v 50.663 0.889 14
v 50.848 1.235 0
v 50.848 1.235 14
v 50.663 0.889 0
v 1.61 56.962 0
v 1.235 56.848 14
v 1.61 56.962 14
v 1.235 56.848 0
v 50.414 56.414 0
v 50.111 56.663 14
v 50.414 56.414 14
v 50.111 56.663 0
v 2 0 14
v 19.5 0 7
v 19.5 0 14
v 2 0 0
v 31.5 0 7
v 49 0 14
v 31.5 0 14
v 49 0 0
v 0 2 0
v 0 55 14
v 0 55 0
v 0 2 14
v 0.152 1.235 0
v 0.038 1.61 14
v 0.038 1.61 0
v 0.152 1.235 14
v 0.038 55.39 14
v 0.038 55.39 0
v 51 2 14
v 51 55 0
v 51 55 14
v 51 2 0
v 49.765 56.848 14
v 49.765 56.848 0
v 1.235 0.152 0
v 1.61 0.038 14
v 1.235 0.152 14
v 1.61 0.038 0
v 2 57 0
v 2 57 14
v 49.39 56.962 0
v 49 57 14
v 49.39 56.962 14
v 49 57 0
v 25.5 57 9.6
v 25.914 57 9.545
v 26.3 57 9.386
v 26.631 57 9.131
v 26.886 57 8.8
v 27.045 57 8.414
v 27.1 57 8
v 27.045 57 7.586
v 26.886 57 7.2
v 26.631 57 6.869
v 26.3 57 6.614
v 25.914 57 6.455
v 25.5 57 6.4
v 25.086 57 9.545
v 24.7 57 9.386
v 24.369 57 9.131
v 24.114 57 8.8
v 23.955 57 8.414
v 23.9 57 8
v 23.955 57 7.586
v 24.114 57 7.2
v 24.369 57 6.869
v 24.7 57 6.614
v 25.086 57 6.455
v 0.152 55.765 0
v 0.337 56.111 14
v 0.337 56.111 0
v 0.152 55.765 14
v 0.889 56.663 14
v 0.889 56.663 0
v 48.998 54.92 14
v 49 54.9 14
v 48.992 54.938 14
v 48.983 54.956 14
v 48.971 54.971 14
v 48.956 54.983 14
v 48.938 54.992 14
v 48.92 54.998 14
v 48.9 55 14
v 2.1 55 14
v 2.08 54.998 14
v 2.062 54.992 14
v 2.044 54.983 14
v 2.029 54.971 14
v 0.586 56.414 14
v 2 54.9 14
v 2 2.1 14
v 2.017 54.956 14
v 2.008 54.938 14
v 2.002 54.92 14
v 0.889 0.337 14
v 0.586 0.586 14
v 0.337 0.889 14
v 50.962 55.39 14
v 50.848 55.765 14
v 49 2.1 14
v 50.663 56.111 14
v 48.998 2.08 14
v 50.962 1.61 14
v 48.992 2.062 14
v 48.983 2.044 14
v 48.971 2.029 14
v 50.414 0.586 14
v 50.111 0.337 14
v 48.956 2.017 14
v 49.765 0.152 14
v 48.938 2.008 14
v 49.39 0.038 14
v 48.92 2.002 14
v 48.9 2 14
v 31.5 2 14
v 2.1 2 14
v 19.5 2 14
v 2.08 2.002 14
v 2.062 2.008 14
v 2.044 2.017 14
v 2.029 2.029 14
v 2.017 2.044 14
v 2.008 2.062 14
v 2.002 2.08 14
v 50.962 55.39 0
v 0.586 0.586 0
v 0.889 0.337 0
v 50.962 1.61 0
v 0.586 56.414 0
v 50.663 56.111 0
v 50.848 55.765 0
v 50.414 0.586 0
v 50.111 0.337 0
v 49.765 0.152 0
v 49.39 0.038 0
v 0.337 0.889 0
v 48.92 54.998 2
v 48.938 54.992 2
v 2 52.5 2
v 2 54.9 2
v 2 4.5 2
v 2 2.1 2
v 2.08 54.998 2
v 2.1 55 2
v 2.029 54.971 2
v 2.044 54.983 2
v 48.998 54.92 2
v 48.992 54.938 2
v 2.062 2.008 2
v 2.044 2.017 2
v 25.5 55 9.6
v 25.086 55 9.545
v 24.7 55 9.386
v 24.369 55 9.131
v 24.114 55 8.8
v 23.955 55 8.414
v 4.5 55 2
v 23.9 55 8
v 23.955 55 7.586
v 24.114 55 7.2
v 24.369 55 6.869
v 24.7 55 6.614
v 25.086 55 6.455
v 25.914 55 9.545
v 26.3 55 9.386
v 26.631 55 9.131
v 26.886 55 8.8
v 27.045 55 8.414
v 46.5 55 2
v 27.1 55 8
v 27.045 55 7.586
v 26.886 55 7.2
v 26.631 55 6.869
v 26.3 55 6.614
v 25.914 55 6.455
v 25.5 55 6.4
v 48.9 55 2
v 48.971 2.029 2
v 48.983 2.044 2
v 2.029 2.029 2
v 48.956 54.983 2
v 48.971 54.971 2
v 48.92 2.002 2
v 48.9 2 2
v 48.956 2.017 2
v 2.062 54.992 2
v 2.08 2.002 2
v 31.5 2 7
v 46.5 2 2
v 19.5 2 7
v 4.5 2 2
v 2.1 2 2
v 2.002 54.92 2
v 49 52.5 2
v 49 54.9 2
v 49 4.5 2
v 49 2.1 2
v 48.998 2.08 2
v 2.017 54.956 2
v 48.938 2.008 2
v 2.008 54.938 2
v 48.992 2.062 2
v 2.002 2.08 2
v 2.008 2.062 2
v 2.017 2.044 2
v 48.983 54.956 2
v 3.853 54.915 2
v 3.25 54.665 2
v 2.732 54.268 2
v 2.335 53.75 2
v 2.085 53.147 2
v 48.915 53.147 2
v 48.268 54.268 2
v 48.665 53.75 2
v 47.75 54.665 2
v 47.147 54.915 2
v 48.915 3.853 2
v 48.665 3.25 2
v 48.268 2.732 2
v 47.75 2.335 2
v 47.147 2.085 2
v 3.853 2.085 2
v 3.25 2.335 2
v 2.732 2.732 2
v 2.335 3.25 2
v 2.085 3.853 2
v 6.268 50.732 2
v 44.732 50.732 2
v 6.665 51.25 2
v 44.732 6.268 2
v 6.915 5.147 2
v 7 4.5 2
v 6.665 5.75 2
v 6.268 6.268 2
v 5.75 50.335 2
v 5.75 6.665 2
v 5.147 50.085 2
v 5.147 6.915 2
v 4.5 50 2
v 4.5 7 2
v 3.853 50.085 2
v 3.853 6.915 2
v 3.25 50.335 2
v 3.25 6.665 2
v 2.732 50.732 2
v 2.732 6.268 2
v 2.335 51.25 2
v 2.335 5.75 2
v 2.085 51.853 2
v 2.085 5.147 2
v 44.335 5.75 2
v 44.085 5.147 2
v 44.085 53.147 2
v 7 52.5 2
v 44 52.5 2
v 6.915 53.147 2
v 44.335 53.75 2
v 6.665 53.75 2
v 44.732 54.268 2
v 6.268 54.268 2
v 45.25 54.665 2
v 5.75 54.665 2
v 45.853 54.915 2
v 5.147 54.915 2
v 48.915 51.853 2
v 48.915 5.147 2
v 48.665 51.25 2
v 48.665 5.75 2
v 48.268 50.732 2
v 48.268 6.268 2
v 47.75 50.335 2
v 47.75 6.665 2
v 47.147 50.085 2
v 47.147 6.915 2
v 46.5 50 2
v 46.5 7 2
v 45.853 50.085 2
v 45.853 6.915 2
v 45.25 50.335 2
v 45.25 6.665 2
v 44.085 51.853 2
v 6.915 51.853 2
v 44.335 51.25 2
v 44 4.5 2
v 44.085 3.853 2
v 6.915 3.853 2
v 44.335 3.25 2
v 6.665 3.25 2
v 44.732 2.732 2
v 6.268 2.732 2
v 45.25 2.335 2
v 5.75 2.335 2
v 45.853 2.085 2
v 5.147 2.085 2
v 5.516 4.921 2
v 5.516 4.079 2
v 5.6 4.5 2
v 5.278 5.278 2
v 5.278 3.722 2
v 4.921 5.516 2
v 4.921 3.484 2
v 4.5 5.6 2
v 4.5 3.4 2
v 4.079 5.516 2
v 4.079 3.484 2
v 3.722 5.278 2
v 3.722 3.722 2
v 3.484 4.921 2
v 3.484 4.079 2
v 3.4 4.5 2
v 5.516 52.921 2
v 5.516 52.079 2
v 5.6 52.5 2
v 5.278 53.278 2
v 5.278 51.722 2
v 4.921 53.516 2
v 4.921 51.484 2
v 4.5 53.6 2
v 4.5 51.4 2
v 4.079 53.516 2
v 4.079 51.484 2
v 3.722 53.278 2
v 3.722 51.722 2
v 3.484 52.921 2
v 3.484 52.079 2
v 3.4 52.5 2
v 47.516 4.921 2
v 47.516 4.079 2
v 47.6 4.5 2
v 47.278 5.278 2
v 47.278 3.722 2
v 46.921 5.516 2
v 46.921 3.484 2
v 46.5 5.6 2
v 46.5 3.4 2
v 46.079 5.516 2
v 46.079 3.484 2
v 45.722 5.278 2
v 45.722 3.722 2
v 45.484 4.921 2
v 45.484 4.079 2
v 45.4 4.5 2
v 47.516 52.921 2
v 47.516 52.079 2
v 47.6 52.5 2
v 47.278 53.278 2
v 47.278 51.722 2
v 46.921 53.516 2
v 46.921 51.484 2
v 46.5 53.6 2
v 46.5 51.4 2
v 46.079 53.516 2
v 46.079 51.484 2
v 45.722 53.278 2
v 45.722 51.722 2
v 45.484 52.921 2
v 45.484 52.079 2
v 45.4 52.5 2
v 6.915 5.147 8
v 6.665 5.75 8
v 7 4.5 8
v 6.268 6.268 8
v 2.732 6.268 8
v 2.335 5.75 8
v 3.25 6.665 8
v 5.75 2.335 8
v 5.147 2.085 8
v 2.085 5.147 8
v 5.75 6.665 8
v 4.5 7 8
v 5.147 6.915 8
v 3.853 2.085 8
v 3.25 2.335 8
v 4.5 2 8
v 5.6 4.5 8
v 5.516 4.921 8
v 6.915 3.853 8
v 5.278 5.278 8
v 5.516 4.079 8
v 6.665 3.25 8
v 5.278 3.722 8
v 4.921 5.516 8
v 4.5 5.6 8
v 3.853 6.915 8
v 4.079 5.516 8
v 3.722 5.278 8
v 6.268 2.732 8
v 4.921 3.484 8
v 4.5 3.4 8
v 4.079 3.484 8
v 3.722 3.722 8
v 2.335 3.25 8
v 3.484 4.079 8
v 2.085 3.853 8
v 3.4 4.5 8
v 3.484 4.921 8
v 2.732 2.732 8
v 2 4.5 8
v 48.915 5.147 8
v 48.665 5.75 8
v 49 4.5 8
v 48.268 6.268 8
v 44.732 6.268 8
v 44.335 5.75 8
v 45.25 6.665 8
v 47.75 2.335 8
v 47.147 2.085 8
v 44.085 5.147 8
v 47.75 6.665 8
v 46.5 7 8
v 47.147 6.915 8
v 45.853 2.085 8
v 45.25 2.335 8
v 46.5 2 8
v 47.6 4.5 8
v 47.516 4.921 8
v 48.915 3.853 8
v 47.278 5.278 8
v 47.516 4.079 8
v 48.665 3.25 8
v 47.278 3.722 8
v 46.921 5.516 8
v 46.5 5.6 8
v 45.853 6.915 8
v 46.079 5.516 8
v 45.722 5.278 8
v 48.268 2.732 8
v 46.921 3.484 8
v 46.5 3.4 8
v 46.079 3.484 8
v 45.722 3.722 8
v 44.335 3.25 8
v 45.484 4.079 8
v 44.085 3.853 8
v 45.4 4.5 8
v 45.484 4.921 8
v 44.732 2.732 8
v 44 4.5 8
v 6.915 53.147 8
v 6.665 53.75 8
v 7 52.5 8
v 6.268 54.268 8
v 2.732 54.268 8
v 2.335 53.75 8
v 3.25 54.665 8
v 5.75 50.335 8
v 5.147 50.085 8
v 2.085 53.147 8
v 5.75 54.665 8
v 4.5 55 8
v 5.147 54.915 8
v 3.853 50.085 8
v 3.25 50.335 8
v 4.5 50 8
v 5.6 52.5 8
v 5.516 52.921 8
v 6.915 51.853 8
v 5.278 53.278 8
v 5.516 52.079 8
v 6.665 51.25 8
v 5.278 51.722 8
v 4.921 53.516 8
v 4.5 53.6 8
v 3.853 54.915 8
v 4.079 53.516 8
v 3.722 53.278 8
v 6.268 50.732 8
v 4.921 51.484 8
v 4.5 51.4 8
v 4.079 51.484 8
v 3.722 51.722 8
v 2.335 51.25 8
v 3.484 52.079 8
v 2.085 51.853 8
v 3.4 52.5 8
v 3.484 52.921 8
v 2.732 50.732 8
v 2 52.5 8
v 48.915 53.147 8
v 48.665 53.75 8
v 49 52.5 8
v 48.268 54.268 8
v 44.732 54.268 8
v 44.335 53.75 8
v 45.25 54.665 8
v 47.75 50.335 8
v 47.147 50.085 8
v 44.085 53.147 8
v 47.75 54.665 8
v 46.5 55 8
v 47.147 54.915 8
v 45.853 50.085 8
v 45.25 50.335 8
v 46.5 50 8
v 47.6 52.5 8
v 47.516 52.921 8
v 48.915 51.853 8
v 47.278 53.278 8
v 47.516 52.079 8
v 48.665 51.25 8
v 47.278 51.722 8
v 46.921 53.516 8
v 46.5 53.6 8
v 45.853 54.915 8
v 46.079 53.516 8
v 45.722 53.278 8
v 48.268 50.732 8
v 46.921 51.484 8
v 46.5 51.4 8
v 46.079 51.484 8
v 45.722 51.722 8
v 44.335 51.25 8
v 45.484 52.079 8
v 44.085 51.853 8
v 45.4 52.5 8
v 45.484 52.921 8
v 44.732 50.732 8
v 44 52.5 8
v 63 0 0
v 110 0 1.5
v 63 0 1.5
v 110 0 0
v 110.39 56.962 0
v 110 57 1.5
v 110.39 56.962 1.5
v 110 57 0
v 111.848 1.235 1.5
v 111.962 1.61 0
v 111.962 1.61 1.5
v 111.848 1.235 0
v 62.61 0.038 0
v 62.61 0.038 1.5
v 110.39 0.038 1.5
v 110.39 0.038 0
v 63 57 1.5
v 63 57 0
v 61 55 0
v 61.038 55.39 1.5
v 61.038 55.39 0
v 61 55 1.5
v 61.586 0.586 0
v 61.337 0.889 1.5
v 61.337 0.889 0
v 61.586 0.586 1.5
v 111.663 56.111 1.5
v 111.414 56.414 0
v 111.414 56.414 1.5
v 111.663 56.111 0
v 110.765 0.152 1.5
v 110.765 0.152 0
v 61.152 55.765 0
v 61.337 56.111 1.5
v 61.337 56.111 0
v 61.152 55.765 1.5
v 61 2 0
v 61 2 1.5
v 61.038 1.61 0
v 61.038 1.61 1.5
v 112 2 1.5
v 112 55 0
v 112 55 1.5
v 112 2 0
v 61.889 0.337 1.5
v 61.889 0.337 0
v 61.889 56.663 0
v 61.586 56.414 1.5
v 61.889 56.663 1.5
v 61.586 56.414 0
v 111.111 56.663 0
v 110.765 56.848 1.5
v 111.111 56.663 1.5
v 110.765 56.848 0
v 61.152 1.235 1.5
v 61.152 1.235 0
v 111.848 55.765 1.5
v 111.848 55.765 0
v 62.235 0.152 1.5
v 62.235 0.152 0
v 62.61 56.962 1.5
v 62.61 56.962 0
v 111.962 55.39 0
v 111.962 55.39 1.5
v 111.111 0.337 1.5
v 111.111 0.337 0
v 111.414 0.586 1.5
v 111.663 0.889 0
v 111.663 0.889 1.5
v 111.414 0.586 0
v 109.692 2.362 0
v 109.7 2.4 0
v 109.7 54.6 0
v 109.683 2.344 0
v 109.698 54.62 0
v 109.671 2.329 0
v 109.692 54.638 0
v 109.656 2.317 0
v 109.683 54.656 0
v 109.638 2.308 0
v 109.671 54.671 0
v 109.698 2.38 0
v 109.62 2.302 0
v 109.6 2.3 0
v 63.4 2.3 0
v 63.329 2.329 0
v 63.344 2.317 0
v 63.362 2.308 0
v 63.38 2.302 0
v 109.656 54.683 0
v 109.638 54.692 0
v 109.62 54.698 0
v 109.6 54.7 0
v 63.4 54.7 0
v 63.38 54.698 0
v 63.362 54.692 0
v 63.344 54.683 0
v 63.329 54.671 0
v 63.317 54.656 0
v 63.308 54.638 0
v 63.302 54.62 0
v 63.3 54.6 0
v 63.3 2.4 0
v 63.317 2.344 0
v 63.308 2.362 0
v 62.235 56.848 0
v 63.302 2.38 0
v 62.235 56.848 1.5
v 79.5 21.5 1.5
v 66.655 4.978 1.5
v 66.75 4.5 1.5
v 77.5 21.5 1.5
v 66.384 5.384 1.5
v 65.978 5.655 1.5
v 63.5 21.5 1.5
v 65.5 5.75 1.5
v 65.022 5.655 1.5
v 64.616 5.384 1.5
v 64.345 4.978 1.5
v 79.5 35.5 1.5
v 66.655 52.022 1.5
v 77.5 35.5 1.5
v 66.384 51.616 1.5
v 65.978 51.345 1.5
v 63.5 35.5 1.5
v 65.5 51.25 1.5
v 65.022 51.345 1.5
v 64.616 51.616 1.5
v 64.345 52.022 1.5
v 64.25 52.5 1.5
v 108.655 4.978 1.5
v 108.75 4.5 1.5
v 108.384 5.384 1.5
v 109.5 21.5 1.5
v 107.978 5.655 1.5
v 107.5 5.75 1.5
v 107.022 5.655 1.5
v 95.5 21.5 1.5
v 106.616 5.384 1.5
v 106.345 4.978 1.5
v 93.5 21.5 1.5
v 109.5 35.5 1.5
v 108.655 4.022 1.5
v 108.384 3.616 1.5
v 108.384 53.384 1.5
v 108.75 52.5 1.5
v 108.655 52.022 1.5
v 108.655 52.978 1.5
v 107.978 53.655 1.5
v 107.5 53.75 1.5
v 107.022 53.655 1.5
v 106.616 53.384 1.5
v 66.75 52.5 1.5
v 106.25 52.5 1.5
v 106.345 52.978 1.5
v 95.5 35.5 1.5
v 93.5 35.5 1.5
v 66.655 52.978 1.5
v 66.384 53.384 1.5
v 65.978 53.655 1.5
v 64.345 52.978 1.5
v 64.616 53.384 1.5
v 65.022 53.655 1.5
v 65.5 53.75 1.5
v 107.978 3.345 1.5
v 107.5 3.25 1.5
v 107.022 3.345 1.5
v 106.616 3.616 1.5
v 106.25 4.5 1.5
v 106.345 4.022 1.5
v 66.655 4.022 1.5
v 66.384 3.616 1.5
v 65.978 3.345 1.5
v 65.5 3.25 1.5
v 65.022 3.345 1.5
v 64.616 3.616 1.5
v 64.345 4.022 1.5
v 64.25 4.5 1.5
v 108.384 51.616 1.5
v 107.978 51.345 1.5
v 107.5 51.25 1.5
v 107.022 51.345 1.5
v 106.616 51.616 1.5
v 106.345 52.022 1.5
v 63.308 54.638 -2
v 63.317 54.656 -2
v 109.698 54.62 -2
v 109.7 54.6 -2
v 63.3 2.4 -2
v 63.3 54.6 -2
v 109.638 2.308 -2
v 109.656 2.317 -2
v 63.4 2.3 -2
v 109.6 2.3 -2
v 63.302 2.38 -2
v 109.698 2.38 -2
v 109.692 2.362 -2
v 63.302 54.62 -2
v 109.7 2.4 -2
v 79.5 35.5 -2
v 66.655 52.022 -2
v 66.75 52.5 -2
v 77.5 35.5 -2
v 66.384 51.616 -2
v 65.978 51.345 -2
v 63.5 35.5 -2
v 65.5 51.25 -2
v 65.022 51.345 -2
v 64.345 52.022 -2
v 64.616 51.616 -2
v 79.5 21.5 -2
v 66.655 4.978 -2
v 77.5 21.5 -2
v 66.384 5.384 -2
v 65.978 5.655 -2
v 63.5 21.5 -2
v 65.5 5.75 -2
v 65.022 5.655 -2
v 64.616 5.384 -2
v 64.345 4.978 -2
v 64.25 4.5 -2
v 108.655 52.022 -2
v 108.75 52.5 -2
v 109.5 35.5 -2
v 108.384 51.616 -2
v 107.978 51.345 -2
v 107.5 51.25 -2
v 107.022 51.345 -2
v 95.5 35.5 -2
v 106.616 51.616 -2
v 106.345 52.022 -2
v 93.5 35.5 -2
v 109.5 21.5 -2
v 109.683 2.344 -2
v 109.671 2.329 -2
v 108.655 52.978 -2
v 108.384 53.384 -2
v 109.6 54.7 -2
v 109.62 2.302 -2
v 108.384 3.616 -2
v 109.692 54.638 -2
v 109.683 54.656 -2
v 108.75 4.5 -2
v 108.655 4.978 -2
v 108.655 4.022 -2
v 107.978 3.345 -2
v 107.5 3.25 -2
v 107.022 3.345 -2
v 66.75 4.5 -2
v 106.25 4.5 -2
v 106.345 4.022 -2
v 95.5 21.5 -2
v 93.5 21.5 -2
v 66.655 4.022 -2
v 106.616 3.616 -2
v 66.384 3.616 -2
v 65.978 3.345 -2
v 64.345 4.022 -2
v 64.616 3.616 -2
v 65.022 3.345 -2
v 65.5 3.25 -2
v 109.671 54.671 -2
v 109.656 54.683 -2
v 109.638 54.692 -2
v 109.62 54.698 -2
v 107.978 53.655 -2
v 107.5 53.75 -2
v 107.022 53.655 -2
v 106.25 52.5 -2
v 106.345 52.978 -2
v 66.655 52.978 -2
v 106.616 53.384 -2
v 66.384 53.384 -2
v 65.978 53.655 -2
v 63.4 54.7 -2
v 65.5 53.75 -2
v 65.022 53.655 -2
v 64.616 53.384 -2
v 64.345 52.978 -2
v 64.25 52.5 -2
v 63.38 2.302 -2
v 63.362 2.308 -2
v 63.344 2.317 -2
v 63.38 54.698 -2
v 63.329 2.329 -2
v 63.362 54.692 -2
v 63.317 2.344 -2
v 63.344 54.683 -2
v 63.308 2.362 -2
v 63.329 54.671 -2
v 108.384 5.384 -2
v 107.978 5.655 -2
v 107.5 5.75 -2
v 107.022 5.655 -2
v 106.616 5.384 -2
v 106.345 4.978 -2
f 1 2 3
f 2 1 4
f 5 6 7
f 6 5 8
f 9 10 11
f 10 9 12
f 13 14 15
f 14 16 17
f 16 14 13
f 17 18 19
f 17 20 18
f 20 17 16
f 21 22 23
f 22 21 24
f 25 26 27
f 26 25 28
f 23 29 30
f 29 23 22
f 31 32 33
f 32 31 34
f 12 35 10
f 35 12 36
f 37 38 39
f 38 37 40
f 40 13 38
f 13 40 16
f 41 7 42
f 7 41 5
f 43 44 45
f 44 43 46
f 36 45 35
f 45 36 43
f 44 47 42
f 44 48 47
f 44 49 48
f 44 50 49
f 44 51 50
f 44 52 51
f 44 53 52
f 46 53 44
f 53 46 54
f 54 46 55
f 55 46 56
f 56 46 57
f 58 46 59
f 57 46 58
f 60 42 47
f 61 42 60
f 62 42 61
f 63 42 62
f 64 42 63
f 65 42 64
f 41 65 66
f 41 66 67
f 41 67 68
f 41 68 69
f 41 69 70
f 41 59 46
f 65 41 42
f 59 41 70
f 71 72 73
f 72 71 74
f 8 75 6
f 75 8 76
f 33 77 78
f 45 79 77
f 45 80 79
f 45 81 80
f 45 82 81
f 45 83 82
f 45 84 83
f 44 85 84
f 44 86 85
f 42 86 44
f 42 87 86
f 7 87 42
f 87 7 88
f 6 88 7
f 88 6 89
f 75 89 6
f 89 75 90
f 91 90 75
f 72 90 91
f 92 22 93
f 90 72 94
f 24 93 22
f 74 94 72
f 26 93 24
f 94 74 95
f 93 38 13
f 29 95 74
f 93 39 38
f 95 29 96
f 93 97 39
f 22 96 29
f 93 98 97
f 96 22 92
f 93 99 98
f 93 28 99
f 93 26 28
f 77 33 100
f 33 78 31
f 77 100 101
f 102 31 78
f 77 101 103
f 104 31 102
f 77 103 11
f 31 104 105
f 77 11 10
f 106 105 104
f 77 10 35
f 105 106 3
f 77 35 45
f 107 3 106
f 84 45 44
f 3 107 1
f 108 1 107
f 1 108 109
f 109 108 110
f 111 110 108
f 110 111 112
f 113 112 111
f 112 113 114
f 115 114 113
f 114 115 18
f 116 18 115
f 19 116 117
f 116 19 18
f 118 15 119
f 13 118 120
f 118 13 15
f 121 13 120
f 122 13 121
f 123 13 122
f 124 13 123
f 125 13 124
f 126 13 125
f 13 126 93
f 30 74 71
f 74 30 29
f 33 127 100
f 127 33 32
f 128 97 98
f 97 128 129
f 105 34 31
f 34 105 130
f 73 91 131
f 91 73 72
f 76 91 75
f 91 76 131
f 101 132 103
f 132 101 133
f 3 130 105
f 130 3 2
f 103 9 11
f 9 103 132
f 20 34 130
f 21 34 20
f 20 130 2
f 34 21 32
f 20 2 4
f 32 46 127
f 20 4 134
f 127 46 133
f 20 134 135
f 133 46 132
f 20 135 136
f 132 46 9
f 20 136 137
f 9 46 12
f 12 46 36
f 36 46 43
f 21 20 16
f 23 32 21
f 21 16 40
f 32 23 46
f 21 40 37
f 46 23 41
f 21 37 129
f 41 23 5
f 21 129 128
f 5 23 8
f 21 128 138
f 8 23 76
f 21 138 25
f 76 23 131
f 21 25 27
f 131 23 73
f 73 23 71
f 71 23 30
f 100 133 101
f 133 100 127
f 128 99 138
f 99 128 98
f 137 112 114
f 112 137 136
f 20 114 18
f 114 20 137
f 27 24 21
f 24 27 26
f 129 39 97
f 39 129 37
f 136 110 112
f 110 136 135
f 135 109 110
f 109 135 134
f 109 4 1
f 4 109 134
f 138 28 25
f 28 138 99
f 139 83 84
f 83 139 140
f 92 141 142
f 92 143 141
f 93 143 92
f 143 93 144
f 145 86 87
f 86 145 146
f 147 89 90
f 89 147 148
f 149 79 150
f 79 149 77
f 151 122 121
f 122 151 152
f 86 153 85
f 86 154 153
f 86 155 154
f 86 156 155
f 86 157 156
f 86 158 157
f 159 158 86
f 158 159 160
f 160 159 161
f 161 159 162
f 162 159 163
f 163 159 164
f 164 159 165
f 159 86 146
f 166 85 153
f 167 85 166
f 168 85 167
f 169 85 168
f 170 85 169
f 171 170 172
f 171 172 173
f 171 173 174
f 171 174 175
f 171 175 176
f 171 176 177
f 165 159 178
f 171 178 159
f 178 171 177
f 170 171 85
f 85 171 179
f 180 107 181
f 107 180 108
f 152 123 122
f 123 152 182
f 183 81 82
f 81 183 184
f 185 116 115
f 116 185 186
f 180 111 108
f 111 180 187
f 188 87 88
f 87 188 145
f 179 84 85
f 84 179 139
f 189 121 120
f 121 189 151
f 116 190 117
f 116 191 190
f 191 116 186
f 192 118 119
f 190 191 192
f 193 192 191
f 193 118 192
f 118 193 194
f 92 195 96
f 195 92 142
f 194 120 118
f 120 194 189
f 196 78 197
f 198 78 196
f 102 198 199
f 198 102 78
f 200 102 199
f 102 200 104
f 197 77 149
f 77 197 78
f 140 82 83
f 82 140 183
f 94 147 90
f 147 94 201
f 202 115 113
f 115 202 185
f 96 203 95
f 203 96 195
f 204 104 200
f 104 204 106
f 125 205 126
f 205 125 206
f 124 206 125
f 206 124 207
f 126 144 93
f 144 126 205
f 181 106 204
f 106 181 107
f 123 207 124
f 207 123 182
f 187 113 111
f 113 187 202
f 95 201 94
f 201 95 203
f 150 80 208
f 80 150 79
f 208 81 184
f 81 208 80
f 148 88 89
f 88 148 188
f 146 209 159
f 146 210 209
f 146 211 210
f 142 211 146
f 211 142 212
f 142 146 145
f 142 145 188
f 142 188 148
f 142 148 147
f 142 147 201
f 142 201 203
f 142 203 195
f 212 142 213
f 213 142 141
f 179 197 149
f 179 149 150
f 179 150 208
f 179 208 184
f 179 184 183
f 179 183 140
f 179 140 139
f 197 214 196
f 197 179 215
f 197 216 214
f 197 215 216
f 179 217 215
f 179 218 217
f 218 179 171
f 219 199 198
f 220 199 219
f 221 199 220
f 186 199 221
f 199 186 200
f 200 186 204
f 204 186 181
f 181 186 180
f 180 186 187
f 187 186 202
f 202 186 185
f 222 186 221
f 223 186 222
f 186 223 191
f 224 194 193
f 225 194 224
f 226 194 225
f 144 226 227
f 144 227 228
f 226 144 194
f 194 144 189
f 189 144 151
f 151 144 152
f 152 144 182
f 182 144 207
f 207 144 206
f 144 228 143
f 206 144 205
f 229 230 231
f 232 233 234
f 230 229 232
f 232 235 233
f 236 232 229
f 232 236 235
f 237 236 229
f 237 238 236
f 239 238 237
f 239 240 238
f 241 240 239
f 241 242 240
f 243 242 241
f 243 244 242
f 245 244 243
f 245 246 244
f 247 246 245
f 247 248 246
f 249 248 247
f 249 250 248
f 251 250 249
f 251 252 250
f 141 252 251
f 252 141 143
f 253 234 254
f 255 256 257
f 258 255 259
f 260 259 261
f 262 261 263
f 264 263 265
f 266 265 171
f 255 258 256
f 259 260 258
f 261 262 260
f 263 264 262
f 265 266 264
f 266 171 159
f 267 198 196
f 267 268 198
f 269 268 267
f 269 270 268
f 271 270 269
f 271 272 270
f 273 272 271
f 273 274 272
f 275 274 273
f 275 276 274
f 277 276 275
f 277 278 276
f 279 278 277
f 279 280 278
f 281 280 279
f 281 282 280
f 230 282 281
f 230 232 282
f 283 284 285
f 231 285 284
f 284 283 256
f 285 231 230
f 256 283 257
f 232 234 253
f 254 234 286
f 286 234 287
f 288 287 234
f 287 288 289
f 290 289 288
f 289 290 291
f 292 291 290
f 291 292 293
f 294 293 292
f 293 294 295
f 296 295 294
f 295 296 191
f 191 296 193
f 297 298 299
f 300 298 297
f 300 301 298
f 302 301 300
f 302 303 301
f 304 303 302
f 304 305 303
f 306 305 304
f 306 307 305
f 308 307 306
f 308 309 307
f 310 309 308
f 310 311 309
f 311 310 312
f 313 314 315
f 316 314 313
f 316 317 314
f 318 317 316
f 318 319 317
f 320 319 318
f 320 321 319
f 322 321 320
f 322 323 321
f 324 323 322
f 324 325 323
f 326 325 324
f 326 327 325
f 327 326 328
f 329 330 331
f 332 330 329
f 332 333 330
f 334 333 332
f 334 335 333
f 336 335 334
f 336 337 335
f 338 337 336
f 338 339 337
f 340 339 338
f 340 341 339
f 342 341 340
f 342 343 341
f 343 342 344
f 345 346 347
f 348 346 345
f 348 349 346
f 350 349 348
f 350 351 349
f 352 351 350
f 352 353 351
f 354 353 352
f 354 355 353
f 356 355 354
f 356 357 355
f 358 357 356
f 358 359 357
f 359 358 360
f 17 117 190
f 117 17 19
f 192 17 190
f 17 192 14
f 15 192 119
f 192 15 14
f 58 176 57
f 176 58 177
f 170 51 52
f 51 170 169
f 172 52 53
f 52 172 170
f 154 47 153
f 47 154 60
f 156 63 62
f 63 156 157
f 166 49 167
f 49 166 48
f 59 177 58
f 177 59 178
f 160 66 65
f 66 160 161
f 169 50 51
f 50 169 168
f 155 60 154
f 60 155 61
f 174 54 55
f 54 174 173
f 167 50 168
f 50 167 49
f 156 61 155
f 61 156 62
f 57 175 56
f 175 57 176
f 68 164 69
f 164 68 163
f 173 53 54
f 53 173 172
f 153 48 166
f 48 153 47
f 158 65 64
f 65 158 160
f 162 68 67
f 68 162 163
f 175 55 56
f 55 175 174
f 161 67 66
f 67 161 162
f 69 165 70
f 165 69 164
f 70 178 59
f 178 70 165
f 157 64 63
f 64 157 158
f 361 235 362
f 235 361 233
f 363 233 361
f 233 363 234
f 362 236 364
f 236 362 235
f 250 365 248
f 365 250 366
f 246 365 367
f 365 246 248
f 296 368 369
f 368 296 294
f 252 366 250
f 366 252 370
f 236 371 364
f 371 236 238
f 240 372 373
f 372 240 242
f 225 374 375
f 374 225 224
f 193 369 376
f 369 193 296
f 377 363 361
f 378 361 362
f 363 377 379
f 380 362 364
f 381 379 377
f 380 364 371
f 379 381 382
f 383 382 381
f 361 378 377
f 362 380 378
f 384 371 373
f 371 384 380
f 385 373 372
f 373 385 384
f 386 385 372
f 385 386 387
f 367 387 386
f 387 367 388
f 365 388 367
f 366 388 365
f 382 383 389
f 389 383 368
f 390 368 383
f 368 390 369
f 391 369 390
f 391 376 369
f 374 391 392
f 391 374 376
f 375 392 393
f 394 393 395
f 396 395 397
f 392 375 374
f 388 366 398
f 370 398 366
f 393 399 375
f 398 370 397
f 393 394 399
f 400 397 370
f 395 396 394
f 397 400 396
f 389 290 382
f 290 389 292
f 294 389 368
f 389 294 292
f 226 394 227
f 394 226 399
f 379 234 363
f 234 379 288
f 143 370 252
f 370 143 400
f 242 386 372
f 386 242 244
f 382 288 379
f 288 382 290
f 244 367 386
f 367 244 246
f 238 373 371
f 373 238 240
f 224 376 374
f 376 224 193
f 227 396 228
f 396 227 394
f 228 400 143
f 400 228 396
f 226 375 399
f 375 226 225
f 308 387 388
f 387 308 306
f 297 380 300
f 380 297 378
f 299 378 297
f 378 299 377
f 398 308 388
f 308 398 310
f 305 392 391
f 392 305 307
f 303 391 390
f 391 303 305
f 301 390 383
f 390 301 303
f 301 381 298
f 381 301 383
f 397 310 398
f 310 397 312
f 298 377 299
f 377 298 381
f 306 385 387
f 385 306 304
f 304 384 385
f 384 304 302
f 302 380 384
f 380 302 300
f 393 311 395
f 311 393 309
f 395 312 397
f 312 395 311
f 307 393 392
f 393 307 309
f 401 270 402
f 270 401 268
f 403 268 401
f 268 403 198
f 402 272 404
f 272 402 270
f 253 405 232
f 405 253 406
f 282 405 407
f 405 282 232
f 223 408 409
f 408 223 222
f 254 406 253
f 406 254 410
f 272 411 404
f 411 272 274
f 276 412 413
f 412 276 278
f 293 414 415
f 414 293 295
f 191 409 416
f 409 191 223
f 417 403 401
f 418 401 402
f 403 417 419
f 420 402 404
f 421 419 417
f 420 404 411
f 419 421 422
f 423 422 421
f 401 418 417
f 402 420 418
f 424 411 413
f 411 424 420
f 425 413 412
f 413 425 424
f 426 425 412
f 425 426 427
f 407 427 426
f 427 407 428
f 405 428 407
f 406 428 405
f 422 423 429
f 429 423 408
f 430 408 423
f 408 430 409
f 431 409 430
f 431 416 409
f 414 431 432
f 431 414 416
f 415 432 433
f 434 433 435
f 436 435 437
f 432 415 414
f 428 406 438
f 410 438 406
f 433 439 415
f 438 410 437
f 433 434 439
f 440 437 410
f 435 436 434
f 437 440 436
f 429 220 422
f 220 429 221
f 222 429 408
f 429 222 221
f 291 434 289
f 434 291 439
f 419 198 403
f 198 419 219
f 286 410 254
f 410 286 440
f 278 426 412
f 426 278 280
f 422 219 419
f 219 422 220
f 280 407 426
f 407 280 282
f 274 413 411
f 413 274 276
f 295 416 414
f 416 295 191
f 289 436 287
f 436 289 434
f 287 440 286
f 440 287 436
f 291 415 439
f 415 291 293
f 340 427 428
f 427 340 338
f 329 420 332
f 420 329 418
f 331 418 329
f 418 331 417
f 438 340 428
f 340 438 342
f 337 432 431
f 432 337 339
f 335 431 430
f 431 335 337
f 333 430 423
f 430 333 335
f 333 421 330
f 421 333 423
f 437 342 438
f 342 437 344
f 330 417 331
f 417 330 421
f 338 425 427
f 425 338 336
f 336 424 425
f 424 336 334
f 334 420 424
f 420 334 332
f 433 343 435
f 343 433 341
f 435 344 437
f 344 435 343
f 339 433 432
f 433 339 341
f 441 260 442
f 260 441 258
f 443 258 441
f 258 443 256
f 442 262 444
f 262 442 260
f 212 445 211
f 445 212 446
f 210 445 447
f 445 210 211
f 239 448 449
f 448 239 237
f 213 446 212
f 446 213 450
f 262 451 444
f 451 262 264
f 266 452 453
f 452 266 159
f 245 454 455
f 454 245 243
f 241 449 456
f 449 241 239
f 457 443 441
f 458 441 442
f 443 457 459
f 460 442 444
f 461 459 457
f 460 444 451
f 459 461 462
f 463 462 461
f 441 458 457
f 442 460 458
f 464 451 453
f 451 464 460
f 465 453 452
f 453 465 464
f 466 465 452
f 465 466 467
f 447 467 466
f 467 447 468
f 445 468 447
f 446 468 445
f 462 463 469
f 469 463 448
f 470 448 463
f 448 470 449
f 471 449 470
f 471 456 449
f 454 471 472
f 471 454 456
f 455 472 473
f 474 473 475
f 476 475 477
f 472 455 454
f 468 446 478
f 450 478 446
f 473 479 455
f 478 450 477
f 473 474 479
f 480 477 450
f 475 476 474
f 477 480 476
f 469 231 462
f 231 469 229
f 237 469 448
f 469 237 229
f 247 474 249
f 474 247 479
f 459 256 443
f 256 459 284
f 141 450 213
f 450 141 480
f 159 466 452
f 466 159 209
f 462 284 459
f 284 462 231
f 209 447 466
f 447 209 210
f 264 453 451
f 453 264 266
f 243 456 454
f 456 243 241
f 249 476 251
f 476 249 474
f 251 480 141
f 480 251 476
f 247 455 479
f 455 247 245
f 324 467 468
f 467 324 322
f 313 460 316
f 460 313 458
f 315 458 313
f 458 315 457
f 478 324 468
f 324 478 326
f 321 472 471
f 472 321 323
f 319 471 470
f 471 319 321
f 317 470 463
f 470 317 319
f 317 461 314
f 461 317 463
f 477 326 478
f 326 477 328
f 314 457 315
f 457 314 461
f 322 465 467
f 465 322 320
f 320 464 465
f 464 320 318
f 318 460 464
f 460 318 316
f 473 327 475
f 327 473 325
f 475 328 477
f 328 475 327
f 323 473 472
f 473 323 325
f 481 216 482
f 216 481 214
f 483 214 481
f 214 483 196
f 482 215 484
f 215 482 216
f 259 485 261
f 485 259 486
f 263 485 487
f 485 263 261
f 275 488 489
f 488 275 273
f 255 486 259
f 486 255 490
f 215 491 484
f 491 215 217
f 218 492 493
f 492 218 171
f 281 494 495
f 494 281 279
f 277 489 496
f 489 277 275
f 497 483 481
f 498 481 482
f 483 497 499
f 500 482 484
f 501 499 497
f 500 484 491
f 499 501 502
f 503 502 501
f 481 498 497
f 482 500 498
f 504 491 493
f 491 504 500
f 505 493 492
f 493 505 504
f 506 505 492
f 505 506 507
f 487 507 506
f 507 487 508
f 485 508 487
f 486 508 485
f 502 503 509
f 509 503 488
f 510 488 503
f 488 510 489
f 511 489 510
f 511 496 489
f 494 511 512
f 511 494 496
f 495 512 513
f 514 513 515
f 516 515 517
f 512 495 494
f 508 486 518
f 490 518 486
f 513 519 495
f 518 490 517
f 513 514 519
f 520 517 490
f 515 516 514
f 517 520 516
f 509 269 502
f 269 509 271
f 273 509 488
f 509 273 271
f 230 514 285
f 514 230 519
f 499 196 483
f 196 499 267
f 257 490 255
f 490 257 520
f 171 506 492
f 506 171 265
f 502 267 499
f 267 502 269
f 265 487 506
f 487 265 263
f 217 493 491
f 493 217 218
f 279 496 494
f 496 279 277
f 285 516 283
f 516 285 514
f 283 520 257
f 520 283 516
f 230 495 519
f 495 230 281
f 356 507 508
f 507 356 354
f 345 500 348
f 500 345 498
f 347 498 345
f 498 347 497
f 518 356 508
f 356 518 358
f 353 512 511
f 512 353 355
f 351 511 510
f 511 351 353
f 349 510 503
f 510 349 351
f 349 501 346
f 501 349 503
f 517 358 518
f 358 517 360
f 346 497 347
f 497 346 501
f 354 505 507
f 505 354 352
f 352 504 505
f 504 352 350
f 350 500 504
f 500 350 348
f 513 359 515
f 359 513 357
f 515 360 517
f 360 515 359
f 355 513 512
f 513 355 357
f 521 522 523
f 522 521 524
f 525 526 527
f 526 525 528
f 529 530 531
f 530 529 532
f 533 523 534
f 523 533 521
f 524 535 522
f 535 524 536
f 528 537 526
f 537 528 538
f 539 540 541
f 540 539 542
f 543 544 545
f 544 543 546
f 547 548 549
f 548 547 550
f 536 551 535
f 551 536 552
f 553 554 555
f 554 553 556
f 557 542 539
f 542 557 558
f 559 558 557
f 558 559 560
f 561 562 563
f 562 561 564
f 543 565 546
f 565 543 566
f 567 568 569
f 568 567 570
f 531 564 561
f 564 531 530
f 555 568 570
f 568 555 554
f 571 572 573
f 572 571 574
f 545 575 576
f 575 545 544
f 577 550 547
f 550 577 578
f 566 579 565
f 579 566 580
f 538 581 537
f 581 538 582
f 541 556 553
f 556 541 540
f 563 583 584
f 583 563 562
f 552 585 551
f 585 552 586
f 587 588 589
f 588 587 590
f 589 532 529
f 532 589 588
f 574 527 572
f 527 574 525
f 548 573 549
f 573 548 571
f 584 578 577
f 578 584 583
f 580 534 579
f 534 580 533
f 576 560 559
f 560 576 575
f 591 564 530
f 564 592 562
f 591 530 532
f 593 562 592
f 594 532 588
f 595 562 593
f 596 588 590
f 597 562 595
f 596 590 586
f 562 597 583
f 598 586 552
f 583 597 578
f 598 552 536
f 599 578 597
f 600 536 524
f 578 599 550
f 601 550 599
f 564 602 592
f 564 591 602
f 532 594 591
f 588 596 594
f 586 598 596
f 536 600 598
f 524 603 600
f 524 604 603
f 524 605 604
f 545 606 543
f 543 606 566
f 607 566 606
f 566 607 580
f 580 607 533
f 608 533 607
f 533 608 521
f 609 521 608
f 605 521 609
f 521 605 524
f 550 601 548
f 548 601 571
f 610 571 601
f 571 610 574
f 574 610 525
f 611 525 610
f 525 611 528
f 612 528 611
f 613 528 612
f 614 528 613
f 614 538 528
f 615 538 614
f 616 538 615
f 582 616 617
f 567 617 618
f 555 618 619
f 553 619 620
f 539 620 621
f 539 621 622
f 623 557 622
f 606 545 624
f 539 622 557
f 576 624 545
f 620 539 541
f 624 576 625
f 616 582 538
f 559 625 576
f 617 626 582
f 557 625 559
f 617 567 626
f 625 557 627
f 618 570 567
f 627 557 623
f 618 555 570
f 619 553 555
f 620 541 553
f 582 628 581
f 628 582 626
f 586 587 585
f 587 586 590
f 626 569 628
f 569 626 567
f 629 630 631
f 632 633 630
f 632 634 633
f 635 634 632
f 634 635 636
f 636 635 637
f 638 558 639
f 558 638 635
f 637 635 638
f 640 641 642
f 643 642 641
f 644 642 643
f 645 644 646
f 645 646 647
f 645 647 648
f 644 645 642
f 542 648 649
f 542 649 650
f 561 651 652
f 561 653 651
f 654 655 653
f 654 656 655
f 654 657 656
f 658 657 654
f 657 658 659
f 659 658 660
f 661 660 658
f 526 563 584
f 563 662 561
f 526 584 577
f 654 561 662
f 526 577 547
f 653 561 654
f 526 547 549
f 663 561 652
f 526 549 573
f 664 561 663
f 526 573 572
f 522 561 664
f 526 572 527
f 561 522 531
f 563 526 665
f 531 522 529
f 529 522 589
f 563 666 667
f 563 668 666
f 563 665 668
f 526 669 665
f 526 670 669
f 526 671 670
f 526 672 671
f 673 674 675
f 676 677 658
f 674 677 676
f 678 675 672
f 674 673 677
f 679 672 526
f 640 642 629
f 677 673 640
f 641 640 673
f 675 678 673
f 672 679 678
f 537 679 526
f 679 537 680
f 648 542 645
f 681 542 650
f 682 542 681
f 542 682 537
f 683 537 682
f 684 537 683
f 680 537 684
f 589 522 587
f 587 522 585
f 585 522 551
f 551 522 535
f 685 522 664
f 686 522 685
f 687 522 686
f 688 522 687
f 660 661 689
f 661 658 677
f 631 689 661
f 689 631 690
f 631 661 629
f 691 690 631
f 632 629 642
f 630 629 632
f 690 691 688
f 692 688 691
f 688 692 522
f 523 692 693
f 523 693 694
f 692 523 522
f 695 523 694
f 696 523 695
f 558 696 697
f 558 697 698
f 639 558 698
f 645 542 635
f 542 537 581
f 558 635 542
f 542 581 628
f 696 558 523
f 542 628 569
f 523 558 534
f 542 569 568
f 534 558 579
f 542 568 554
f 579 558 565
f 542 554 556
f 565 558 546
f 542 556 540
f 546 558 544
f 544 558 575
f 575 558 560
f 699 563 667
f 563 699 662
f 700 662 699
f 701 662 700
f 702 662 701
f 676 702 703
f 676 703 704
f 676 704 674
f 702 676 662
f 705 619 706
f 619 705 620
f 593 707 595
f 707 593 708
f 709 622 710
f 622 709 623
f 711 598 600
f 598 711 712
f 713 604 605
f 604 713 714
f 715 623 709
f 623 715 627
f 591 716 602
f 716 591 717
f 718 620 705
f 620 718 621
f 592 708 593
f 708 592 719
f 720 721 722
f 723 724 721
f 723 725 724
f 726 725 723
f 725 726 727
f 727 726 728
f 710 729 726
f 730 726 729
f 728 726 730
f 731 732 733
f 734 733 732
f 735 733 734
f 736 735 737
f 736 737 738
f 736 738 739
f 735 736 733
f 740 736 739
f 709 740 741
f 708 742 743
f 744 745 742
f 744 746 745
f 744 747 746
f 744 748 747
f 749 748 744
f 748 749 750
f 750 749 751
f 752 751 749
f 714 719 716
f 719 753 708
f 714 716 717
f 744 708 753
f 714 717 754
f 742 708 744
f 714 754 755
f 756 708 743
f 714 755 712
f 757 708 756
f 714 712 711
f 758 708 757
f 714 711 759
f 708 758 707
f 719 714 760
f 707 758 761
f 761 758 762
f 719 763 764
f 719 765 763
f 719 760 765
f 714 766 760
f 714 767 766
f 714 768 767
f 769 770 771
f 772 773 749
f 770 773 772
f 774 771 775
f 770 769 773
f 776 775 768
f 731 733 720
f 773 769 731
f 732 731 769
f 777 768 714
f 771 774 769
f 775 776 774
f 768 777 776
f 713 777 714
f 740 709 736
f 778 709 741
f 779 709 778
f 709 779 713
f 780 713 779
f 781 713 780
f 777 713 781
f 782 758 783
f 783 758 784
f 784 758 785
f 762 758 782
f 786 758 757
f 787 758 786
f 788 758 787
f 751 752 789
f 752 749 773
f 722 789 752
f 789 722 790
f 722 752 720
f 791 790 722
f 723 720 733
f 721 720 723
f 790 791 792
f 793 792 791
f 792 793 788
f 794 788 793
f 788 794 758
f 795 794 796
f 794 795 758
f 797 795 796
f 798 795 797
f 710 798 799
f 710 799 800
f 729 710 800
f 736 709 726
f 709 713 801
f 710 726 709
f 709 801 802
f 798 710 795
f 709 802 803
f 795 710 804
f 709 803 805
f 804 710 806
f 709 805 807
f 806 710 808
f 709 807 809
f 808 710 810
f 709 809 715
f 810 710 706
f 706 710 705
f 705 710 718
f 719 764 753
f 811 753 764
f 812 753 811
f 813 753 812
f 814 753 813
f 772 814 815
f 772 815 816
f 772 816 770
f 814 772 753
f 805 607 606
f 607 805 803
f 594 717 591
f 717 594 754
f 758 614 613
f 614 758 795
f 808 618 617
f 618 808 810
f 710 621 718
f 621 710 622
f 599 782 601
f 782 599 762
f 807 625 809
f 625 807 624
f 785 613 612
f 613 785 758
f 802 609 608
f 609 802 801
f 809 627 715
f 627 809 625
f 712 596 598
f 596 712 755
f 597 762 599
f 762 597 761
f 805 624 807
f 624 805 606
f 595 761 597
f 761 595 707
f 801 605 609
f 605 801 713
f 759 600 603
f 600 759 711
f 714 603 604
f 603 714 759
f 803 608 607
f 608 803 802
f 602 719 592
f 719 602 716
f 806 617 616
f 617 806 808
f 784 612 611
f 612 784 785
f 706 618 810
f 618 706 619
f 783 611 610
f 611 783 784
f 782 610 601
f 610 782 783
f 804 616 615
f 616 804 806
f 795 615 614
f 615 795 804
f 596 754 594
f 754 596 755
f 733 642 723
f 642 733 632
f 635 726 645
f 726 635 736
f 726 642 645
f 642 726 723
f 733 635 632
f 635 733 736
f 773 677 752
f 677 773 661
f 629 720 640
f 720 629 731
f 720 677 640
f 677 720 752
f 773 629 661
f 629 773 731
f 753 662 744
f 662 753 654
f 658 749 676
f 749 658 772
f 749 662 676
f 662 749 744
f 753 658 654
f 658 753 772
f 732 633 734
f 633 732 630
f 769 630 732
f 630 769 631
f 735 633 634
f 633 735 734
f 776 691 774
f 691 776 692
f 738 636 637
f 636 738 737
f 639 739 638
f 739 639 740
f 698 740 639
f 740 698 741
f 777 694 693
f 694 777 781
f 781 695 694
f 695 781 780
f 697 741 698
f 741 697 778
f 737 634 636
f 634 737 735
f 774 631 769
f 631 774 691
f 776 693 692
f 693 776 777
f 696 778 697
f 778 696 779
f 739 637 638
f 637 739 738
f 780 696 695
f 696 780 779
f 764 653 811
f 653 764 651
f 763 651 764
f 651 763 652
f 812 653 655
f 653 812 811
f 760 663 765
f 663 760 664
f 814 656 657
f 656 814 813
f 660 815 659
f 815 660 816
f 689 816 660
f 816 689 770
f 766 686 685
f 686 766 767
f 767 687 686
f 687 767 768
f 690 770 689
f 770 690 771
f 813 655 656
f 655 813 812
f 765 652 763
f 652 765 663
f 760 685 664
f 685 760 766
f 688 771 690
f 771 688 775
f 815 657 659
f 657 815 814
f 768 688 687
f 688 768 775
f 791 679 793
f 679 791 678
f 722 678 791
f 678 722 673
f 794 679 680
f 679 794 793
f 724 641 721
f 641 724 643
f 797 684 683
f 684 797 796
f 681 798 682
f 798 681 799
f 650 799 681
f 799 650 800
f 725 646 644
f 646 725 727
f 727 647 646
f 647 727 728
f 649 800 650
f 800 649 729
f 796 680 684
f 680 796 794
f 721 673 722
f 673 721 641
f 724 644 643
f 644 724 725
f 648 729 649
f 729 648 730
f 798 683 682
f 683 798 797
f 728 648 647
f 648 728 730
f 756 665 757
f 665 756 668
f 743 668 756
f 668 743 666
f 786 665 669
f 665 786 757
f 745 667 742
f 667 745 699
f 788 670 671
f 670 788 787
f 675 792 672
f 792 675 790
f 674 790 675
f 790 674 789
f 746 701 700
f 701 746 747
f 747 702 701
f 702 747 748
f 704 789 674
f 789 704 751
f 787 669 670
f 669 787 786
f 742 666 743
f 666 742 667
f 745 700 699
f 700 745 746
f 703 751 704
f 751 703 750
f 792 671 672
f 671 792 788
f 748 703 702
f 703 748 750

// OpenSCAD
/*
 * VibeKey 3-Button Keyboard Case
 * ================================
 * A 3D-printable enclosure for three MX key switches
 * and an ESP32 dev board.
 *
 * Usage:
 *   1. Open this file in OpenSCAD (free: openscad.org)
 *   2. Adjust the dimensions below to match your specific ESP32 board
 *   3. Render one part at a time:
 *      - Comment out top_plate() to export the base
 *      - Comment out base() to export the top plate
 *   4. Export as STL -> slice -> print
 *
 * Print Settings:
 *   Layer height: 0.2mm
 *   Infill: 20%
 *   Supports: None needed
 *   Material: PLA or PETG
 */

// -- CONFIGURATION (mm) -- Adjust these to fit your board --------

// Number of keys
num_keys = 3;

// ESP32 board dimensions (measure your specific board!)
board_width  = 28;    // Width of the ESP32 PCB
board_length = 52;    // Length of the ESP32 PCB
board_height = 12;    // Height clearance for components on the bottom

// Case properties
wall = 2;             // Wall thickness
bottom = 2;           // Bottom plate thickness
tolerance = 0.5;      // Extra space around the board for fit
corner_r = 2;         // Corner rounding radius

// MX switch cutout (standard -- don't change)
switch_cutout = 14;   // 14mm x 14mm is MX standard
switch_plate_thickness = 1.5;  // Plate thickness for switch clip
switch_spacing = 2;   // Gap between switch cutouts

// USB port cutout
usb_width  = 12;      // Width of USB-C connector + clearance
usb_height = 7;       // Height of USB-C connector + clearance

// LED hole (set to 0 to disable)
led_hole_dia = 3.2;   // Diameter for 3mm LED press-fit

// Screw mount (set to 0 to use friction fit instead)
screw_dia = 2.2;      // M2 self-tapping screw hole
screw_boss_dia = 5;   // Outer diameter of screw boss
screw_depth = 6;      // Depth of screw hole

// -- CALCULATED VALUES ------------------------------------------

// Top plate width: enough for all switches side by side with spacing
keys_width = num_keys * switch_cutout + (num_keys - 1) * switch_spacing;
// Inner width is the wider of the board or the keys row, plus tolerance
inner_w = max(board_width, keys_width) + tolerance * 2;
inner_l = board_length + tolerance * 2;
outer_w = inner_w + wall * 2;
outer_l = inner_l + wall * 2;
case_height = bottom + board_height;

// -- RENDER CONTROL ---------------------------------------------
// Comment/uncomment to export one part at a time

base();
translate([outer_w + 10, 0, 0]) top_plate();

// -- MODULES ----------------------------------------------------

module rounded_box(w, l, h, r) {
    // A box with rounded vertical edges
    hull() {
        translate([r, r, 0]) cylinder(h=h, r=r, $fn=32);
        translate([w-r, r, 0]) cylinder(h=h, r=r, $fn=32);
        translate([r, l-r, 0]) cylinder(h=h, r=r, $fn=32);
        translate([w-r, l-r, 0]) cylinder(h=h, r=r, $fn=32);
    }
}

module base() {
    difference() {
        // Outer shell with rounded corners
        rounded_box(outer_w, outer_l, case_height, corner_r);

        // Inner cavity
        translate([wall, wall, bottom])
            rounded_box(inner_w, inner_l, case_height, max(0.1, corner_r - wall));

        // USB-C port cutout (on the short side, centered)
        translate([(outer_w - usb_width) / 2, -0.1, bottom + board_height - usb_height])
            cube([usb_width, wall + 0.2, usb_height + 1]);

        // LED hole on the front face (opposite USB side)
        if (led_hole_dia > 0) {
            translate([outer_w / 2, outer_l + 0.1, bottom + board_height / 2])
                rotate([90, 0, 0])
                    cylinder(d=led_hole_dia, h=wall + 0.2, $fn=24);
        }
    }

    // Screw bosses in corners (optional)
    if (screw_dia > 0) {
        for (pos = [
            [wall + screw_boss_dia/2, wall + screw_boss_dia/2],
            [outer_w - wall - screw_boss_dia/2, wall + screw_boss_dia/2],
            [wall + screw_boss_dia/2, outer_l - wall - screw_boss_dia/2],
            [outer_w - wall - screw_boss_dia/2, outer_l - wall - screw_boss_dia/2],
        ]) {
            translate([pos[0], pos[1], bottom])
                difference() {
                    cylinder(d=screw_boss_dia, h=screw_depth, $fn=24);
                    translate([0, 0, -0.1])
                        cylinder(d=screw_dia, h=screw_depth + 0.2, $fn=16);
                }
        }
    }
}

module top_plate() {
    plate_w = outer_w;
    plate_l = outer_l;
    plate_h = switch_plate_thickness;

    // Lip dimensions (sits inside the base walls)
    lip_depth = 2;
    lip_inset = 0.3;  // Slight inset for friction fit

    difference() {
        union() {
            // Main plate with rounded corners
            rounded_box(plate_w, plate_l, plate_h, corner_r);

            // Inner lip that drops into the base
            translate([wall + lip_inset, wall + lip_inset, -lip_depth])
                rounded_box(
                    inner_w - lip_inset * 2,
                    inner_l - lip_inset * 2,
                    lip_depth,
                    max(0.1, corner_r - wall - lip_inset)
                );
        }

        // MX switch cutouts — centered as a row
        row_start_x = (plate_w - keys_width) / 2;
        center_y = plate_l / 2 - switch_cutout / 2;

        for (i = [0 : num_keys - 1]) {
            x = row_start_x + i * (switch_cutout + switch_spacing);
            translate([x, center_y, -lip_depth - 0.1])
                cube([switch_cutout, switch_cutout, plate_h + lip_depth + 0.2]);
        }

        // Screw holes (matching base bosses)
        if (screw_dia > 0) {
            for (pos = [
                [wall + screw_boss_dia/2, wall + screw_boss_dia/2],
                [plate_w - wall - screw_boss_dia/2, wall + screw_boss_dia/2],
                [wall + screw_boss_dia/2, plate_l - wall - screw_boss_dia/2],
                [plate_w - wall - screw_boss_dia/2, plate_l - wall - screw_boss_dia/2],
            ]) {
                translate([pos[0], pos[1], -lip_depth - 0.1])
                    cylinder(d=screw_dia + 0.3, h=plate_h + lip_depth + 0.2, $fn=16);
            }
        }
    }
}
